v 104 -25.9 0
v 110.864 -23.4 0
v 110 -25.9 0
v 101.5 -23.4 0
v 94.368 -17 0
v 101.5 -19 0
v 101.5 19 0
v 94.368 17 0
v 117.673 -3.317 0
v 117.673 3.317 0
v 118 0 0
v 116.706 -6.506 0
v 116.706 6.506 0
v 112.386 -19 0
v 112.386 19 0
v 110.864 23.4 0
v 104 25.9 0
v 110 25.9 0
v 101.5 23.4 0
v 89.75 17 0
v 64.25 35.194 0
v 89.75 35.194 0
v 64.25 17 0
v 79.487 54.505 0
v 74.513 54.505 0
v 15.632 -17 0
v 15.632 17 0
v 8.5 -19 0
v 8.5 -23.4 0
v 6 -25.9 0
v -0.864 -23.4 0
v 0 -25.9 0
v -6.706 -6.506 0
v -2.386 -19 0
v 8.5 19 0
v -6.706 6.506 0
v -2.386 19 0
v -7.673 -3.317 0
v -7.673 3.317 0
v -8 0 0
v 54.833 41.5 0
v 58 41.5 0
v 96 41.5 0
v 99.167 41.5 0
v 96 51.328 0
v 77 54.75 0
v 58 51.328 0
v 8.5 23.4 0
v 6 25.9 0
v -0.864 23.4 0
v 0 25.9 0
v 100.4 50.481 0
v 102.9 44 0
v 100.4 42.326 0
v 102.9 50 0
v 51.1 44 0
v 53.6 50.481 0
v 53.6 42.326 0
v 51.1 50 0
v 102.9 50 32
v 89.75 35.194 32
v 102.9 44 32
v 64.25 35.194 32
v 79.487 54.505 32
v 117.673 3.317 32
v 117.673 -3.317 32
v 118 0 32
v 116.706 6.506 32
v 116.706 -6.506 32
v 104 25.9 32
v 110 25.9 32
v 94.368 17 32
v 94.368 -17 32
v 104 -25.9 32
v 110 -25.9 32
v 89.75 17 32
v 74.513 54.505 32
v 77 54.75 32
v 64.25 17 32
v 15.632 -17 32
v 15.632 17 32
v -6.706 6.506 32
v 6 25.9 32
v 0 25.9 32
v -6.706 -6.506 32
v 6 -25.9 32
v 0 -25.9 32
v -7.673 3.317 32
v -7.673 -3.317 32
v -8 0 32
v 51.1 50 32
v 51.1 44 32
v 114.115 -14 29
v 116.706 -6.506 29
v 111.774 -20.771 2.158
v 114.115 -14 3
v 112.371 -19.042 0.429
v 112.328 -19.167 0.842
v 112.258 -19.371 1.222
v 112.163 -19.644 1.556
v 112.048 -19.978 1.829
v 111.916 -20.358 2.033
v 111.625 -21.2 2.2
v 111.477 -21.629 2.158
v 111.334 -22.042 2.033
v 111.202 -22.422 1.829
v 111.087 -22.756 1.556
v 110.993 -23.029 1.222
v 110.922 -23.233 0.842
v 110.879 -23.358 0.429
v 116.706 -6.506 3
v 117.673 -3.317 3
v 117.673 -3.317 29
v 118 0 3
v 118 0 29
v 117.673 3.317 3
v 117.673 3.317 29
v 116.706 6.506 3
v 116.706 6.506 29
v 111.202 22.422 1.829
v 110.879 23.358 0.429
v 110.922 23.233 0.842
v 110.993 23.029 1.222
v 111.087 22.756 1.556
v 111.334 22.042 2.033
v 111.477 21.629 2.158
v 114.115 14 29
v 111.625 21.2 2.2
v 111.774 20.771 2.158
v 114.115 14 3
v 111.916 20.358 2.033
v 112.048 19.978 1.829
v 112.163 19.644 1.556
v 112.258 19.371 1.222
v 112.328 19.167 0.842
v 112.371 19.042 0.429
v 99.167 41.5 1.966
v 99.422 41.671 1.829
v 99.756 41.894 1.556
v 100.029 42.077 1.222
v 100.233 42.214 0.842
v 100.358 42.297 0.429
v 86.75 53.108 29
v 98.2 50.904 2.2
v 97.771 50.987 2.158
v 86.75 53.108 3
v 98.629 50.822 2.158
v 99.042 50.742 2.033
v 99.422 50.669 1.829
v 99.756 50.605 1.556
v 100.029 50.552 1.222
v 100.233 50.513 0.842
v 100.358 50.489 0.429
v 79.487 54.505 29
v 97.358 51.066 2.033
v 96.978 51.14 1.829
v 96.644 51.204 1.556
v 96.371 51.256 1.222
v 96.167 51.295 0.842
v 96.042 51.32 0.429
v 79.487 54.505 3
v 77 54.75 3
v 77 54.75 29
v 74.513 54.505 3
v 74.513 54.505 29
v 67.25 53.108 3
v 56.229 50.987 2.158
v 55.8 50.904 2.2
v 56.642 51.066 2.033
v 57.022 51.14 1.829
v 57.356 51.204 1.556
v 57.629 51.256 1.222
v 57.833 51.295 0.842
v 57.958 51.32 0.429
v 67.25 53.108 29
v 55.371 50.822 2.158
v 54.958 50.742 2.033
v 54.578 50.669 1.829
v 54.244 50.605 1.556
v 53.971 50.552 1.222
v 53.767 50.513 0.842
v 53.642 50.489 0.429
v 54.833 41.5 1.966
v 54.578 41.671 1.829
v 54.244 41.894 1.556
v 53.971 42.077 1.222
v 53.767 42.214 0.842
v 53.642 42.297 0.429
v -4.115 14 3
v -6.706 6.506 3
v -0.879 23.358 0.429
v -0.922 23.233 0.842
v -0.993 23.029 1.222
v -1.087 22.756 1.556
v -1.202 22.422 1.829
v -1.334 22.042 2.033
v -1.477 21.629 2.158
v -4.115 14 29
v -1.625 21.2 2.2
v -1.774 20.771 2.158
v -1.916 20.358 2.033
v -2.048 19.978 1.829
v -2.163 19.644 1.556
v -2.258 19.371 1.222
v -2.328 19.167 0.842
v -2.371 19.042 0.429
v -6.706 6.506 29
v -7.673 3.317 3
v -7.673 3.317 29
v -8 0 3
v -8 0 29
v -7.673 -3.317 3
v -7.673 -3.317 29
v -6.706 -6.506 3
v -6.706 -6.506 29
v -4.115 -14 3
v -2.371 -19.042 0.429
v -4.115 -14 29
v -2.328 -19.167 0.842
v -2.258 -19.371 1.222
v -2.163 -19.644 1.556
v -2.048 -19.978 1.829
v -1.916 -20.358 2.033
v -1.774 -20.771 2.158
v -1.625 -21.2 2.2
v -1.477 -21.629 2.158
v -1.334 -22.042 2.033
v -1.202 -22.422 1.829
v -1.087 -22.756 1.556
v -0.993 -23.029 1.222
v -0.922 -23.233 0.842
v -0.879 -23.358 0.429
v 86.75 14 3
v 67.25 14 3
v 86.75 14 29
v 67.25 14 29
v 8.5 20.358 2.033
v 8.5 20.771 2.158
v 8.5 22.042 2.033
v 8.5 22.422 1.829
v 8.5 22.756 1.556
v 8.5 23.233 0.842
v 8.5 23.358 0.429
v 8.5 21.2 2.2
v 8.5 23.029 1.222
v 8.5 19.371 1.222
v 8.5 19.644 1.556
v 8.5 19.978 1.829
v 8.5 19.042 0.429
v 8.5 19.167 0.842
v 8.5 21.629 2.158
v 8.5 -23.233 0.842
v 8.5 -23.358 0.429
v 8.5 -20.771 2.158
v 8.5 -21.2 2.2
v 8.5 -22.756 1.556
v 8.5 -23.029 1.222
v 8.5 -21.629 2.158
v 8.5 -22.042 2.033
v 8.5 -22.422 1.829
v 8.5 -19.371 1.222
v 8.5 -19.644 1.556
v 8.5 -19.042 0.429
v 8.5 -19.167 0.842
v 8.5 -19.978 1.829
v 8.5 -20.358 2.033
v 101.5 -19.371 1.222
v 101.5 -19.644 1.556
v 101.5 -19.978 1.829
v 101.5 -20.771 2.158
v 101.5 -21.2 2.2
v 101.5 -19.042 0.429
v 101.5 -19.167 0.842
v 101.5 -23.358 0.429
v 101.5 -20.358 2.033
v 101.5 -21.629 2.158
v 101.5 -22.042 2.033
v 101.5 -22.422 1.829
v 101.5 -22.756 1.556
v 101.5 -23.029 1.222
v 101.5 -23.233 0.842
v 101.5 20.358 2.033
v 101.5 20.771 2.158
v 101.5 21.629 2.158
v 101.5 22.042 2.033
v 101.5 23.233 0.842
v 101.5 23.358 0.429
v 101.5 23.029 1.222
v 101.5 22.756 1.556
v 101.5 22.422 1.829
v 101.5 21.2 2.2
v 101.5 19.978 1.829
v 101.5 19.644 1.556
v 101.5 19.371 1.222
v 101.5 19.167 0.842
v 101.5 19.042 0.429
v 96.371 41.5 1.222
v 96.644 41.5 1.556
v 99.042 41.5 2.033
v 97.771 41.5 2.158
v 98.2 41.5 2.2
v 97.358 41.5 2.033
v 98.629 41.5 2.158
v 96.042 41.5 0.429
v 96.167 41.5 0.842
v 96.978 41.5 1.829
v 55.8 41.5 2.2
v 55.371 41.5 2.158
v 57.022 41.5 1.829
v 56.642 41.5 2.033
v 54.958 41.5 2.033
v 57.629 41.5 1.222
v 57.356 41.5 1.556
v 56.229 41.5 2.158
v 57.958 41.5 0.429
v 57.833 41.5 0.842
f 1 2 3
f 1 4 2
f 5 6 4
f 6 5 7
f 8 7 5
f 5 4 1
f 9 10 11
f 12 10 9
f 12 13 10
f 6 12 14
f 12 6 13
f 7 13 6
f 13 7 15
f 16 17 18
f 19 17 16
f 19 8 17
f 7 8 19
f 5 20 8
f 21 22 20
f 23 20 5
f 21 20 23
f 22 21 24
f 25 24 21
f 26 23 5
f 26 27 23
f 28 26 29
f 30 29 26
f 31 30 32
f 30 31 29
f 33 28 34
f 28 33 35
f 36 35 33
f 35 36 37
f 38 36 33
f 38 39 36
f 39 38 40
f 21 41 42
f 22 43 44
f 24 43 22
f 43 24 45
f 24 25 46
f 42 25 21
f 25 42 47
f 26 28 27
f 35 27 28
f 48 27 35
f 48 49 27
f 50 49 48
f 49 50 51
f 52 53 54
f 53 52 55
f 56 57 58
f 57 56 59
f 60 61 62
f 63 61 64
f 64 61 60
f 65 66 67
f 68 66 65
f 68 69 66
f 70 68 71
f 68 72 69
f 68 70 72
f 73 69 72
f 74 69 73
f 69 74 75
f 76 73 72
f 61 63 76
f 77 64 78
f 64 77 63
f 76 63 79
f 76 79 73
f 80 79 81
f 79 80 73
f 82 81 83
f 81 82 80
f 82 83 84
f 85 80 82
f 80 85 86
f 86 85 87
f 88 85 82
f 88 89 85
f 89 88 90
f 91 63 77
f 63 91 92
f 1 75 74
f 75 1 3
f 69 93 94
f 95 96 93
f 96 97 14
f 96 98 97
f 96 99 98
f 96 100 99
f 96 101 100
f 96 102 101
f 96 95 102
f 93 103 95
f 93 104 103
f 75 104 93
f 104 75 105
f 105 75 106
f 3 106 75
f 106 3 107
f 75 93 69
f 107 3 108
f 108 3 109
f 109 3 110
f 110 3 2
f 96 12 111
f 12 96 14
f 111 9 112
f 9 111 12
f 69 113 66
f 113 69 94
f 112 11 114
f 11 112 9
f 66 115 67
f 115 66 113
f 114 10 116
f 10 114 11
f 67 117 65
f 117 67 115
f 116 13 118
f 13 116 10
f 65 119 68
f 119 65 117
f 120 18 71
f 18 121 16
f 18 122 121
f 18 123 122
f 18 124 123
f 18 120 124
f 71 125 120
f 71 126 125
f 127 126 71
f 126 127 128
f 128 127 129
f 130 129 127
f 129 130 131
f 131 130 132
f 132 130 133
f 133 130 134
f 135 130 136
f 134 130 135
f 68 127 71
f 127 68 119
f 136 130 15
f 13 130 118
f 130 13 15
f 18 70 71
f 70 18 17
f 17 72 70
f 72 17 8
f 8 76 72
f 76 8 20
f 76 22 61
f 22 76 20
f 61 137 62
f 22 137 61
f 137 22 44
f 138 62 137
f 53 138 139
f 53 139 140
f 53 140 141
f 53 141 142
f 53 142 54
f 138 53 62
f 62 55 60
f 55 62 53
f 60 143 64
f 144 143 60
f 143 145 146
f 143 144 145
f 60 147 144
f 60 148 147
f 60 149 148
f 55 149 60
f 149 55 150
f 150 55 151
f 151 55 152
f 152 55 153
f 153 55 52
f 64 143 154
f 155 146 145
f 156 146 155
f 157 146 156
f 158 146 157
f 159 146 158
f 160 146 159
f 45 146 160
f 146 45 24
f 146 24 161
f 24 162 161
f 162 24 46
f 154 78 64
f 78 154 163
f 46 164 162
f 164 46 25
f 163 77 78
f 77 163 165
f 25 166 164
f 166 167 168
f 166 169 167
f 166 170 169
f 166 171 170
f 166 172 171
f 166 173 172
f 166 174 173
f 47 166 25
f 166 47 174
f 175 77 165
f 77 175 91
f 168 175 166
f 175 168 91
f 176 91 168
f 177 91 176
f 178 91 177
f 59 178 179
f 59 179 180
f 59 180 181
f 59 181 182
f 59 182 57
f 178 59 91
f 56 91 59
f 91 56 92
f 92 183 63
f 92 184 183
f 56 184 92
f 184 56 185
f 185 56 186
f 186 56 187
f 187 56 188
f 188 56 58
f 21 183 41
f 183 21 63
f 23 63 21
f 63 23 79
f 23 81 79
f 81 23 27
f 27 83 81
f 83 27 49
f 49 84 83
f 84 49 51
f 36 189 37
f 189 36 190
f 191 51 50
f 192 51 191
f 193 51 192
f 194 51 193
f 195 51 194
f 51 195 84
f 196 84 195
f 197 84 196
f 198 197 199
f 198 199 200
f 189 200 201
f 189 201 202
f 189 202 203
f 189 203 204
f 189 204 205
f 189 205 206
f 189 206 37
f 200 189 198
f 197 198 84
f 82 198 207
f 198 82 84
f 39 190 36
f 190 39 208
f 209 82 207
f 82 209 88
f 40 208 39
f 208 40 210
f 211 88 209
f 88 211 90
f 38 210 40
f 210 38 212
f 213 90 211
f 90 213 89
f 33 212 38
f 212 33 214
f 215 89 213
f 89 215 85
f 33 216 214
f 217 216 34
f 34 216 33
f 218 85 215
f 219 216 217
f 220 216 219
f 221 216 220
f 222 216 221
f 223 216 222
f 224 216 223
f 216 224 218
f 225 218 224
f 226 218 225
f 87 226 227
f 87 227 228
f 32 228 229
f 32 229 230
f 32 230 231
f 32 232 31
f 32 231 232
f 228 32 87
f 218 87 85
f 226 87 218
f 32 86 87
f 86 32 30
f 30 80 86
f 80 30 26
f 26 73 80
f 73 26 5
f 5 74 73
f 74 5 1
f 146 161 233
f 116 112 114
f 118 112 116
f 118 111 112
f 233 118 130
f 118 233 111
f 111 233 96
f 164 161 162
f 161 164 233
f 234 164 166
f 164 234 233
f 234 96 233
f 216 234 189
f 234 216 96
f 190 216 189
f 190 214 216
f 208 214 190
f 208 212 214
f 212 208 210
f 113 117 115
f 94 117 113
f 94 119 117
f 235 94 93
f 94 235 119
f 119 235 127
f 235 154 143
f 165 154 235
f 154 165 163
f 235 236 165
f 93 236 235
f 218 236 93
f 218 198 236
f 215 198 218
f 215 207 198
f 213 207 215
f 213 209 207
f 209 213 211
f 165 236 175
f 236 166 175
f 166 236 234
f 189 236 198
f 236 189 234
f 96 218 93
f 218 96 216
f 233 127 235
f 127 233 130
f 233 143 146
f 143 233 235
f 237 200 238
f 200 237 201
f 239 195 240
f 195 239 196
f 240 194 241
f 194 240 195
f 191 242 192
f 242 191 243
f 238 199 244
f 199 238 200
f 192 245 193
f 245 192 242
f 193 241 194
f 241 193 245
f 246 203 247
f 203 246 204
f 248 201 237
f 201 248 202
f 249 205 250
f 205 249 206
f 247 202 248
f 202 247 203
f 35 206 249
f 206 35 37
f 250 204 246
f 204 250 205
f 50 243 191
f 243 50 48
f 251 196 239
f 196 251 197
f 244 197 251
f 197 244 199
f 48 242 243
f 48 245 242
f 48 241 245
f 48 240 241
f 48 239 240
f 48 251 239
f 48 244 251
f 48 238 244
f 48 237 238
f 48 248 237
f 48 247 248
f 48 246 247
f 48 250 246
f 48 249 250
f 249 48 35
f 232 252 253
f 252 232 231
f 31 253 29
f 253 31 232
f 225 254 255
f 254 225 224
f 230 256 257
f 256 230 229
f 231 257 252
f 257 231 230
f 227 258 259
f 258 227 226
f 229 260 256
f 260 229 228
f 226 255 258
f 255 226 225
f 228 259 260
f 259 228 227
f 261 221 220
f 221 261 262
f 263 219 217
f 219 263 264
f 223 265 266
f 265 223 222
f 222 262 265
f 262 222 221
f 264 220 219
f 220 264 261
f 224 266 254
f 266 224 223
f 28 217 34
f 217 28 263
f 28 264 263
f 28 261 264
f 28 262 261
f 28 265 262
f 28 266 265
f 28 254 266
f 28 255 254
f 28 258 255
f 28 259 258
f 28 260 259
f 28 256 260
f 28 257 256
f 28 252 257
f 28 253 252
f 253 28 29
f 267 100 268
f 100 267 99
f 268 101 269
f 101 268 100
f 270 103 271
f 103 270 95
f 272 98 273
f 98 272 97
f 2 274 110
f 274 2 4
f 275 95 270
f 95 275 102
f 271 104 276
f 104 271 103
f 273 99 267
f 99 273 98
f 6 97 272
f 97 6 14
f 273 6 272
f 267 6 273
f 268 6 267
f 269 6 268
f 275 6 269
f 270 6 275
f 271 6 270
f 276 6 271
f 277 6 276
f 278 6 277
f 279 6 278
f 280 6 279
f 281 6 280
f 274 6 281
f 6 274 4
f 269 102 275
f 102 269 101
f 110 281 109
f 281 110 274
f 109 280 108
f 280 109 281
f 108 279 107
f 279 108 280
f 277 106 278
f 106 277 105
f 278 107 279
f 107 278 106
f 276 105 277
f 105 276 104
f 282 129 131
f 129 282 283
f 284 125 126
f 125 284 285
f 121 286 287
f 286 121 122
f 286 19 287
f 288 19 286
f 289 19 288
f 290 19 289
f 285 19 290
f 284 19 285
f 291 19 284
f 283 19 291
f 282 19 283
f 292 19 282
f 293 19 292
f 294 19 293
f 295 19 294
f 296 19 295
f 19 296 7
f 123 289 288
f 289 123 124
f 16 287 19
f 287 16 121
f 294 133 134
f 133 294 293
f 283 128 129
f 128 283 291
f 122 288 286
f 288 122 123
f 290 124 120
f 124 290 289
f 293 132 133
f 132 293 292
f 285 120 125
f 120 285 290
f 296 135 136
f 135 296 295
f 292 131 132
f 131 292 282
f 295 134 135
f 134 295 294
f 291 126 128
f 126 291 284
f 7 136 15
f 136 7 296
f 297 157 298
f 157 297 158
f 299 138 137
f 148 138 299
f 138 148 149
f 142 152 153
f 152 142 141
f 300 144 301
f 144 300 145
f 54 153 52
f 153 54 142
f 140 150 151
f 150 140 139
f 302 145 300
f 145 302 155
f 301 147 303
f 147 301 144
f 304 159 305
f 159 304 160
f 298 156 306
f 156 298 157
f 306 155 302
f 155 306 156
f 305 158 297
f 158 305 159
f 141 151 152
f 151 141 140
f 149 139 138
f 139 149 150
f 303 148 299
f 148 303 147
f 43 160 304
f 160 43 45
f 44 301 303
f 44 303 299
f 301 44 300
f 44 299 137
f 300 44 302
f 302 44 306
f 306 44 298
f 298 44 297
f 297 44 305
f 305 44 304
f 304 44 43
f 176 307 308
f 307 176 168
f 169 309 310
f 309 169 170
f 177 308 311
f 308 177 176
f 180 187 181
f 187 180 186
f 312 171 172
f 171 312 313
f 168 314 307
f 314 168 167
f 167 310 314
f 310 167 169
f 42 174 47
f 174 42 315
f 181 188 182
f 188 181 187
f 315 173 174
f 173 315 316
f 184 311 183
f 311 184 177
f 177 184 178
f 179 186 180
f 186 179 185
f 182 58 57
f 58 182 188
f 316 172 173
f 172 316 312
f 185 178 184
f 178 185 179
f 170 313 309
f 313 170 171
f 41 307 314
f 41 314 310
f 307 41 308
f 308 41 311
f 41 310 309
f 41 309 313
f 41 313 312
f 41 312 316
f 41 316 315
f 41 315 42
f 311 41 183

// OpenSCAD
$fn = 32;

// ----------------------------------------------------------------------
// Air duct: 34 mm duct, 3 mm wall, 32 mm across
// ----------------------------------------------------------------------

// --- parameters (mm) ---
duct_r = 17;              // duct core radius
duct_d = 34;              // duct core diameter
wall = 3;                 // duct wall thickness
height = 32;              // duct width (extrusion height)
port_r = 25.9;            // port flange half width
port_d = 51.8;            // port flange width
port_t = 6;               // port flange thickness
bolt_d = 4.4;             // port bolt holes
bolt_offset = 21.2;       // bolt hole offset from the port axis
branch_r = 12.75;         // branch core radius
branch_d = 25.5;          // branch core diameter
branch_len = 50;          // branch length from the run axis

difference() {
  /* outer hull chain: tube with a flat flange plate at every port */
  linear_extrude(height = 32) {
    hull() {
      polygon([[0, -25.9], [0, 25.9], [6, 25.9], [6, -25.9]]);
      translate([9, 0]) circle(r = 17);
    }
    hull() {
      translate([9, 0]) circle(r = 17);
      translate([33, 0]) circle(r = 17);
    }
    hull() {
      translate([33, 0]) circle(r = 17);
      translate([77, 0]) circle(r = 17);
    }
    hull() {
      translate([77, 0]) circle(r = 17);
      translate([101, 0]) circle(r = 17);
    }
    hull() {
      translate([101, 0]) circle(r = 17);
      polygon([[110, 25.9], [110, -25.9], [104, -25.9], [104, 25.9]]);
    }
    hull() {
      translate([77, 0]) circle(r = 12.75);
      translate([77, 27.5]) circle(r = 12.75);
    }
    hull() {
      translate([77, 27.5]) circle(r = 12.75);
      translate([77, 42]) circle(r = 12.75);
    }
    hull() {
      translate([77, 42]) circle(r = 12.75);
      polygon([[51.1, 50], [102.9, 50], [102.9, 44], [51.1, 44]]);
    }
  }
  /* air passage: the same chain inset by the wall, 5 mm proud of the ports */
  translate([0, 0, 3]) linear_extrude(height = 26) {
    hull() {
      translate([-5, 0]) circle(r = 14);
      translate([33, 0]) circle(r = 14);
    }
    hull() {
      translate([33, 0]) circle(r = 14);
      translate([77, 0]) circle(r = 14);
    }
    hull() {
      translate([77, 0]) circle(r = 14);
      translate([115, 0]) circle(r = 14);
    }
    hull() {
      translate([77, 0]) circle(r = 9.75);
      translate([77, 27.5]) circle(r = 9.75);
    }
    hull() {
      translate([77, 27.5]) circle(r = 9.75);
      translate([77, 55]) circle(r = 9.75);
    }
  }
  translate([0, 0]) rotate([0, 0, -90]) translate([-21.2, -2.5]) rotate([-90, 0, 0]) cylinder(h = 11, d = 4.4);
  translate([0, 0]) rotate([0, 0, -90]) translate([21.2, -2.5]) rotate([-90, 0, 0]) cylinder(h = 11, d = 4.4);
  translate([110, 0]) rotate([0, 0, 90]) translate([-21.2, -2.5]) rotate([-90, 0, 0]) cylinder(h = 11, d = 4.4);
  translate([110, 0]) rotate([0, 0, 90]) translate([21.2, -2.5]) rotate([-90, 0, 0]) cylinder(h = 11, d = 4.4);
  translate([77, 50]) rotate([0, 0, 180]) translate([-21.2, -2.5]) rotate([-90, 0, 0]) cylinder(h = 11, d = 4.4);
  translate([77, 50]) rotate([0, 0, 180]) translate([21.2, -2.5]) rotate([-90, 0, 0]) cylinder(h = 11, d = 4.4);
}
